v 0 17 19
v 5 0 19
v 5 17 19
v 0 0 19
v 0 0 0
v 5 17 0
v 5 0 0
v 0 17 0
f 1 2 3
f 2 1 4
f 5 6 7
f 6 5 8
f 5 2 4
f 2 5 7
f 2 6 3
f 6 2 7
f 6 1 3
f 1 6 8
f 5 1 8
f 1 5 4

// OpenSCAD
// Generated by SolidPython 1.0.1 on 2020-07-29 00:39:26


cube(size = [5, 17, 19]);
/***********************************************
*********      SolidPython code:      **********
************************************************
 
# import packages: SolidPython
from solid import *
from solid.utils import *
from itertools import chain, combinations


class Resize:

    def __init__(self, scad_file):
        self.scad_file = scad_file
        #self.scad_file = import_scad(scad_file)
        # cone/cylinder param:
        self.r1 = 0
        self.r2 = 0
        self.h = 0
        # rectangular prism param:
        self.w = 0
        self.l = 0
        # ellipse param:
        self.r = 0

    # import OpenScad code (file name corresponds to shape)


    # classify shape + parameters
    def assign(self, param1, param2, param3):
        if self.scad_file == 'cone.scad':
            self.r1 = param1
            self.r2 = param2
            self.h = param3
        elif self.scad_file == 'cylinder.scad':
            self.r1 = param1
            self.r2 = param2
            self.h = param3
        elif self.scad_file == 'rectangularPrism.scad':
            self.h = param1
            self.l = param2
            self.w = param3
        else:
            self.r = param1
            self.h = param2

    # resize parameters
    def iterate(self):
        x = range(3, 20, 2)
        i = 1
        if self.scad_file == 'cone.scad':
            tempList = list(combinations(x, 2))
            for temp in tempList:
                param1 = temp[0]
                param2 = temp[1]
                filepath = 'produced_scad_files/' + 'cone' + str(param1) + '_' + str(param2) + '_' + '.scad'
                scad_render_to_file(cylinder(h=param1, r1=param2, r2=0), filepath)

        elif self.scad_file == 'cylinder.scad':
            tempList = list(combinations(x, 3))
            for temp in tempList:
                param1 = temp[0]
                param2 = temp[1]
                filepath = 'produced_scad_files/' + 'cylinder' + str(param1) + '_' + str(param2) + '_' + '.scad'
                scad_render_to_file(cylinder(h=param1, r1=param2, r2=param2), filepath)

        elif self.scad_file == 'rectangularPrism.scad':
            tempList = list(combinations(x, 3))
            for temp in tempList:
                param1 = temp[0]
                param2 = temp[1]
                param3 = temp[2]
                filepath = 'produced_scad_files/' + 'rectangularPrism' + str(param1) + '_' + str(param2) + '_' + str(
                    param3) + '.scad'
                scad_render_to_file(cube(size=(param1, param2, param3)), filepath)

        elif self.scad_file == 'ellipse.scad':
            tempList = list(combinations(x, 4))
            for temp in tempList:
                param1 = temp[0]
                param2 = temp[1]
                param3 = temp[2]
                param4 = temp[3]
                filepath = 'produced_scad_files/' + 'ellipse' + str(param1) + '_' + str(param2) + '_' + str(param3) + '_' + str(param4) + '.scad'
                scad_render_to_file(scale([param1, param2, param3])(sphere(r=param4)), filepath)

    def render_to_scadfile(self):
        scad_render_to_file(scad, 'example.scad') 
 
************************************************/
